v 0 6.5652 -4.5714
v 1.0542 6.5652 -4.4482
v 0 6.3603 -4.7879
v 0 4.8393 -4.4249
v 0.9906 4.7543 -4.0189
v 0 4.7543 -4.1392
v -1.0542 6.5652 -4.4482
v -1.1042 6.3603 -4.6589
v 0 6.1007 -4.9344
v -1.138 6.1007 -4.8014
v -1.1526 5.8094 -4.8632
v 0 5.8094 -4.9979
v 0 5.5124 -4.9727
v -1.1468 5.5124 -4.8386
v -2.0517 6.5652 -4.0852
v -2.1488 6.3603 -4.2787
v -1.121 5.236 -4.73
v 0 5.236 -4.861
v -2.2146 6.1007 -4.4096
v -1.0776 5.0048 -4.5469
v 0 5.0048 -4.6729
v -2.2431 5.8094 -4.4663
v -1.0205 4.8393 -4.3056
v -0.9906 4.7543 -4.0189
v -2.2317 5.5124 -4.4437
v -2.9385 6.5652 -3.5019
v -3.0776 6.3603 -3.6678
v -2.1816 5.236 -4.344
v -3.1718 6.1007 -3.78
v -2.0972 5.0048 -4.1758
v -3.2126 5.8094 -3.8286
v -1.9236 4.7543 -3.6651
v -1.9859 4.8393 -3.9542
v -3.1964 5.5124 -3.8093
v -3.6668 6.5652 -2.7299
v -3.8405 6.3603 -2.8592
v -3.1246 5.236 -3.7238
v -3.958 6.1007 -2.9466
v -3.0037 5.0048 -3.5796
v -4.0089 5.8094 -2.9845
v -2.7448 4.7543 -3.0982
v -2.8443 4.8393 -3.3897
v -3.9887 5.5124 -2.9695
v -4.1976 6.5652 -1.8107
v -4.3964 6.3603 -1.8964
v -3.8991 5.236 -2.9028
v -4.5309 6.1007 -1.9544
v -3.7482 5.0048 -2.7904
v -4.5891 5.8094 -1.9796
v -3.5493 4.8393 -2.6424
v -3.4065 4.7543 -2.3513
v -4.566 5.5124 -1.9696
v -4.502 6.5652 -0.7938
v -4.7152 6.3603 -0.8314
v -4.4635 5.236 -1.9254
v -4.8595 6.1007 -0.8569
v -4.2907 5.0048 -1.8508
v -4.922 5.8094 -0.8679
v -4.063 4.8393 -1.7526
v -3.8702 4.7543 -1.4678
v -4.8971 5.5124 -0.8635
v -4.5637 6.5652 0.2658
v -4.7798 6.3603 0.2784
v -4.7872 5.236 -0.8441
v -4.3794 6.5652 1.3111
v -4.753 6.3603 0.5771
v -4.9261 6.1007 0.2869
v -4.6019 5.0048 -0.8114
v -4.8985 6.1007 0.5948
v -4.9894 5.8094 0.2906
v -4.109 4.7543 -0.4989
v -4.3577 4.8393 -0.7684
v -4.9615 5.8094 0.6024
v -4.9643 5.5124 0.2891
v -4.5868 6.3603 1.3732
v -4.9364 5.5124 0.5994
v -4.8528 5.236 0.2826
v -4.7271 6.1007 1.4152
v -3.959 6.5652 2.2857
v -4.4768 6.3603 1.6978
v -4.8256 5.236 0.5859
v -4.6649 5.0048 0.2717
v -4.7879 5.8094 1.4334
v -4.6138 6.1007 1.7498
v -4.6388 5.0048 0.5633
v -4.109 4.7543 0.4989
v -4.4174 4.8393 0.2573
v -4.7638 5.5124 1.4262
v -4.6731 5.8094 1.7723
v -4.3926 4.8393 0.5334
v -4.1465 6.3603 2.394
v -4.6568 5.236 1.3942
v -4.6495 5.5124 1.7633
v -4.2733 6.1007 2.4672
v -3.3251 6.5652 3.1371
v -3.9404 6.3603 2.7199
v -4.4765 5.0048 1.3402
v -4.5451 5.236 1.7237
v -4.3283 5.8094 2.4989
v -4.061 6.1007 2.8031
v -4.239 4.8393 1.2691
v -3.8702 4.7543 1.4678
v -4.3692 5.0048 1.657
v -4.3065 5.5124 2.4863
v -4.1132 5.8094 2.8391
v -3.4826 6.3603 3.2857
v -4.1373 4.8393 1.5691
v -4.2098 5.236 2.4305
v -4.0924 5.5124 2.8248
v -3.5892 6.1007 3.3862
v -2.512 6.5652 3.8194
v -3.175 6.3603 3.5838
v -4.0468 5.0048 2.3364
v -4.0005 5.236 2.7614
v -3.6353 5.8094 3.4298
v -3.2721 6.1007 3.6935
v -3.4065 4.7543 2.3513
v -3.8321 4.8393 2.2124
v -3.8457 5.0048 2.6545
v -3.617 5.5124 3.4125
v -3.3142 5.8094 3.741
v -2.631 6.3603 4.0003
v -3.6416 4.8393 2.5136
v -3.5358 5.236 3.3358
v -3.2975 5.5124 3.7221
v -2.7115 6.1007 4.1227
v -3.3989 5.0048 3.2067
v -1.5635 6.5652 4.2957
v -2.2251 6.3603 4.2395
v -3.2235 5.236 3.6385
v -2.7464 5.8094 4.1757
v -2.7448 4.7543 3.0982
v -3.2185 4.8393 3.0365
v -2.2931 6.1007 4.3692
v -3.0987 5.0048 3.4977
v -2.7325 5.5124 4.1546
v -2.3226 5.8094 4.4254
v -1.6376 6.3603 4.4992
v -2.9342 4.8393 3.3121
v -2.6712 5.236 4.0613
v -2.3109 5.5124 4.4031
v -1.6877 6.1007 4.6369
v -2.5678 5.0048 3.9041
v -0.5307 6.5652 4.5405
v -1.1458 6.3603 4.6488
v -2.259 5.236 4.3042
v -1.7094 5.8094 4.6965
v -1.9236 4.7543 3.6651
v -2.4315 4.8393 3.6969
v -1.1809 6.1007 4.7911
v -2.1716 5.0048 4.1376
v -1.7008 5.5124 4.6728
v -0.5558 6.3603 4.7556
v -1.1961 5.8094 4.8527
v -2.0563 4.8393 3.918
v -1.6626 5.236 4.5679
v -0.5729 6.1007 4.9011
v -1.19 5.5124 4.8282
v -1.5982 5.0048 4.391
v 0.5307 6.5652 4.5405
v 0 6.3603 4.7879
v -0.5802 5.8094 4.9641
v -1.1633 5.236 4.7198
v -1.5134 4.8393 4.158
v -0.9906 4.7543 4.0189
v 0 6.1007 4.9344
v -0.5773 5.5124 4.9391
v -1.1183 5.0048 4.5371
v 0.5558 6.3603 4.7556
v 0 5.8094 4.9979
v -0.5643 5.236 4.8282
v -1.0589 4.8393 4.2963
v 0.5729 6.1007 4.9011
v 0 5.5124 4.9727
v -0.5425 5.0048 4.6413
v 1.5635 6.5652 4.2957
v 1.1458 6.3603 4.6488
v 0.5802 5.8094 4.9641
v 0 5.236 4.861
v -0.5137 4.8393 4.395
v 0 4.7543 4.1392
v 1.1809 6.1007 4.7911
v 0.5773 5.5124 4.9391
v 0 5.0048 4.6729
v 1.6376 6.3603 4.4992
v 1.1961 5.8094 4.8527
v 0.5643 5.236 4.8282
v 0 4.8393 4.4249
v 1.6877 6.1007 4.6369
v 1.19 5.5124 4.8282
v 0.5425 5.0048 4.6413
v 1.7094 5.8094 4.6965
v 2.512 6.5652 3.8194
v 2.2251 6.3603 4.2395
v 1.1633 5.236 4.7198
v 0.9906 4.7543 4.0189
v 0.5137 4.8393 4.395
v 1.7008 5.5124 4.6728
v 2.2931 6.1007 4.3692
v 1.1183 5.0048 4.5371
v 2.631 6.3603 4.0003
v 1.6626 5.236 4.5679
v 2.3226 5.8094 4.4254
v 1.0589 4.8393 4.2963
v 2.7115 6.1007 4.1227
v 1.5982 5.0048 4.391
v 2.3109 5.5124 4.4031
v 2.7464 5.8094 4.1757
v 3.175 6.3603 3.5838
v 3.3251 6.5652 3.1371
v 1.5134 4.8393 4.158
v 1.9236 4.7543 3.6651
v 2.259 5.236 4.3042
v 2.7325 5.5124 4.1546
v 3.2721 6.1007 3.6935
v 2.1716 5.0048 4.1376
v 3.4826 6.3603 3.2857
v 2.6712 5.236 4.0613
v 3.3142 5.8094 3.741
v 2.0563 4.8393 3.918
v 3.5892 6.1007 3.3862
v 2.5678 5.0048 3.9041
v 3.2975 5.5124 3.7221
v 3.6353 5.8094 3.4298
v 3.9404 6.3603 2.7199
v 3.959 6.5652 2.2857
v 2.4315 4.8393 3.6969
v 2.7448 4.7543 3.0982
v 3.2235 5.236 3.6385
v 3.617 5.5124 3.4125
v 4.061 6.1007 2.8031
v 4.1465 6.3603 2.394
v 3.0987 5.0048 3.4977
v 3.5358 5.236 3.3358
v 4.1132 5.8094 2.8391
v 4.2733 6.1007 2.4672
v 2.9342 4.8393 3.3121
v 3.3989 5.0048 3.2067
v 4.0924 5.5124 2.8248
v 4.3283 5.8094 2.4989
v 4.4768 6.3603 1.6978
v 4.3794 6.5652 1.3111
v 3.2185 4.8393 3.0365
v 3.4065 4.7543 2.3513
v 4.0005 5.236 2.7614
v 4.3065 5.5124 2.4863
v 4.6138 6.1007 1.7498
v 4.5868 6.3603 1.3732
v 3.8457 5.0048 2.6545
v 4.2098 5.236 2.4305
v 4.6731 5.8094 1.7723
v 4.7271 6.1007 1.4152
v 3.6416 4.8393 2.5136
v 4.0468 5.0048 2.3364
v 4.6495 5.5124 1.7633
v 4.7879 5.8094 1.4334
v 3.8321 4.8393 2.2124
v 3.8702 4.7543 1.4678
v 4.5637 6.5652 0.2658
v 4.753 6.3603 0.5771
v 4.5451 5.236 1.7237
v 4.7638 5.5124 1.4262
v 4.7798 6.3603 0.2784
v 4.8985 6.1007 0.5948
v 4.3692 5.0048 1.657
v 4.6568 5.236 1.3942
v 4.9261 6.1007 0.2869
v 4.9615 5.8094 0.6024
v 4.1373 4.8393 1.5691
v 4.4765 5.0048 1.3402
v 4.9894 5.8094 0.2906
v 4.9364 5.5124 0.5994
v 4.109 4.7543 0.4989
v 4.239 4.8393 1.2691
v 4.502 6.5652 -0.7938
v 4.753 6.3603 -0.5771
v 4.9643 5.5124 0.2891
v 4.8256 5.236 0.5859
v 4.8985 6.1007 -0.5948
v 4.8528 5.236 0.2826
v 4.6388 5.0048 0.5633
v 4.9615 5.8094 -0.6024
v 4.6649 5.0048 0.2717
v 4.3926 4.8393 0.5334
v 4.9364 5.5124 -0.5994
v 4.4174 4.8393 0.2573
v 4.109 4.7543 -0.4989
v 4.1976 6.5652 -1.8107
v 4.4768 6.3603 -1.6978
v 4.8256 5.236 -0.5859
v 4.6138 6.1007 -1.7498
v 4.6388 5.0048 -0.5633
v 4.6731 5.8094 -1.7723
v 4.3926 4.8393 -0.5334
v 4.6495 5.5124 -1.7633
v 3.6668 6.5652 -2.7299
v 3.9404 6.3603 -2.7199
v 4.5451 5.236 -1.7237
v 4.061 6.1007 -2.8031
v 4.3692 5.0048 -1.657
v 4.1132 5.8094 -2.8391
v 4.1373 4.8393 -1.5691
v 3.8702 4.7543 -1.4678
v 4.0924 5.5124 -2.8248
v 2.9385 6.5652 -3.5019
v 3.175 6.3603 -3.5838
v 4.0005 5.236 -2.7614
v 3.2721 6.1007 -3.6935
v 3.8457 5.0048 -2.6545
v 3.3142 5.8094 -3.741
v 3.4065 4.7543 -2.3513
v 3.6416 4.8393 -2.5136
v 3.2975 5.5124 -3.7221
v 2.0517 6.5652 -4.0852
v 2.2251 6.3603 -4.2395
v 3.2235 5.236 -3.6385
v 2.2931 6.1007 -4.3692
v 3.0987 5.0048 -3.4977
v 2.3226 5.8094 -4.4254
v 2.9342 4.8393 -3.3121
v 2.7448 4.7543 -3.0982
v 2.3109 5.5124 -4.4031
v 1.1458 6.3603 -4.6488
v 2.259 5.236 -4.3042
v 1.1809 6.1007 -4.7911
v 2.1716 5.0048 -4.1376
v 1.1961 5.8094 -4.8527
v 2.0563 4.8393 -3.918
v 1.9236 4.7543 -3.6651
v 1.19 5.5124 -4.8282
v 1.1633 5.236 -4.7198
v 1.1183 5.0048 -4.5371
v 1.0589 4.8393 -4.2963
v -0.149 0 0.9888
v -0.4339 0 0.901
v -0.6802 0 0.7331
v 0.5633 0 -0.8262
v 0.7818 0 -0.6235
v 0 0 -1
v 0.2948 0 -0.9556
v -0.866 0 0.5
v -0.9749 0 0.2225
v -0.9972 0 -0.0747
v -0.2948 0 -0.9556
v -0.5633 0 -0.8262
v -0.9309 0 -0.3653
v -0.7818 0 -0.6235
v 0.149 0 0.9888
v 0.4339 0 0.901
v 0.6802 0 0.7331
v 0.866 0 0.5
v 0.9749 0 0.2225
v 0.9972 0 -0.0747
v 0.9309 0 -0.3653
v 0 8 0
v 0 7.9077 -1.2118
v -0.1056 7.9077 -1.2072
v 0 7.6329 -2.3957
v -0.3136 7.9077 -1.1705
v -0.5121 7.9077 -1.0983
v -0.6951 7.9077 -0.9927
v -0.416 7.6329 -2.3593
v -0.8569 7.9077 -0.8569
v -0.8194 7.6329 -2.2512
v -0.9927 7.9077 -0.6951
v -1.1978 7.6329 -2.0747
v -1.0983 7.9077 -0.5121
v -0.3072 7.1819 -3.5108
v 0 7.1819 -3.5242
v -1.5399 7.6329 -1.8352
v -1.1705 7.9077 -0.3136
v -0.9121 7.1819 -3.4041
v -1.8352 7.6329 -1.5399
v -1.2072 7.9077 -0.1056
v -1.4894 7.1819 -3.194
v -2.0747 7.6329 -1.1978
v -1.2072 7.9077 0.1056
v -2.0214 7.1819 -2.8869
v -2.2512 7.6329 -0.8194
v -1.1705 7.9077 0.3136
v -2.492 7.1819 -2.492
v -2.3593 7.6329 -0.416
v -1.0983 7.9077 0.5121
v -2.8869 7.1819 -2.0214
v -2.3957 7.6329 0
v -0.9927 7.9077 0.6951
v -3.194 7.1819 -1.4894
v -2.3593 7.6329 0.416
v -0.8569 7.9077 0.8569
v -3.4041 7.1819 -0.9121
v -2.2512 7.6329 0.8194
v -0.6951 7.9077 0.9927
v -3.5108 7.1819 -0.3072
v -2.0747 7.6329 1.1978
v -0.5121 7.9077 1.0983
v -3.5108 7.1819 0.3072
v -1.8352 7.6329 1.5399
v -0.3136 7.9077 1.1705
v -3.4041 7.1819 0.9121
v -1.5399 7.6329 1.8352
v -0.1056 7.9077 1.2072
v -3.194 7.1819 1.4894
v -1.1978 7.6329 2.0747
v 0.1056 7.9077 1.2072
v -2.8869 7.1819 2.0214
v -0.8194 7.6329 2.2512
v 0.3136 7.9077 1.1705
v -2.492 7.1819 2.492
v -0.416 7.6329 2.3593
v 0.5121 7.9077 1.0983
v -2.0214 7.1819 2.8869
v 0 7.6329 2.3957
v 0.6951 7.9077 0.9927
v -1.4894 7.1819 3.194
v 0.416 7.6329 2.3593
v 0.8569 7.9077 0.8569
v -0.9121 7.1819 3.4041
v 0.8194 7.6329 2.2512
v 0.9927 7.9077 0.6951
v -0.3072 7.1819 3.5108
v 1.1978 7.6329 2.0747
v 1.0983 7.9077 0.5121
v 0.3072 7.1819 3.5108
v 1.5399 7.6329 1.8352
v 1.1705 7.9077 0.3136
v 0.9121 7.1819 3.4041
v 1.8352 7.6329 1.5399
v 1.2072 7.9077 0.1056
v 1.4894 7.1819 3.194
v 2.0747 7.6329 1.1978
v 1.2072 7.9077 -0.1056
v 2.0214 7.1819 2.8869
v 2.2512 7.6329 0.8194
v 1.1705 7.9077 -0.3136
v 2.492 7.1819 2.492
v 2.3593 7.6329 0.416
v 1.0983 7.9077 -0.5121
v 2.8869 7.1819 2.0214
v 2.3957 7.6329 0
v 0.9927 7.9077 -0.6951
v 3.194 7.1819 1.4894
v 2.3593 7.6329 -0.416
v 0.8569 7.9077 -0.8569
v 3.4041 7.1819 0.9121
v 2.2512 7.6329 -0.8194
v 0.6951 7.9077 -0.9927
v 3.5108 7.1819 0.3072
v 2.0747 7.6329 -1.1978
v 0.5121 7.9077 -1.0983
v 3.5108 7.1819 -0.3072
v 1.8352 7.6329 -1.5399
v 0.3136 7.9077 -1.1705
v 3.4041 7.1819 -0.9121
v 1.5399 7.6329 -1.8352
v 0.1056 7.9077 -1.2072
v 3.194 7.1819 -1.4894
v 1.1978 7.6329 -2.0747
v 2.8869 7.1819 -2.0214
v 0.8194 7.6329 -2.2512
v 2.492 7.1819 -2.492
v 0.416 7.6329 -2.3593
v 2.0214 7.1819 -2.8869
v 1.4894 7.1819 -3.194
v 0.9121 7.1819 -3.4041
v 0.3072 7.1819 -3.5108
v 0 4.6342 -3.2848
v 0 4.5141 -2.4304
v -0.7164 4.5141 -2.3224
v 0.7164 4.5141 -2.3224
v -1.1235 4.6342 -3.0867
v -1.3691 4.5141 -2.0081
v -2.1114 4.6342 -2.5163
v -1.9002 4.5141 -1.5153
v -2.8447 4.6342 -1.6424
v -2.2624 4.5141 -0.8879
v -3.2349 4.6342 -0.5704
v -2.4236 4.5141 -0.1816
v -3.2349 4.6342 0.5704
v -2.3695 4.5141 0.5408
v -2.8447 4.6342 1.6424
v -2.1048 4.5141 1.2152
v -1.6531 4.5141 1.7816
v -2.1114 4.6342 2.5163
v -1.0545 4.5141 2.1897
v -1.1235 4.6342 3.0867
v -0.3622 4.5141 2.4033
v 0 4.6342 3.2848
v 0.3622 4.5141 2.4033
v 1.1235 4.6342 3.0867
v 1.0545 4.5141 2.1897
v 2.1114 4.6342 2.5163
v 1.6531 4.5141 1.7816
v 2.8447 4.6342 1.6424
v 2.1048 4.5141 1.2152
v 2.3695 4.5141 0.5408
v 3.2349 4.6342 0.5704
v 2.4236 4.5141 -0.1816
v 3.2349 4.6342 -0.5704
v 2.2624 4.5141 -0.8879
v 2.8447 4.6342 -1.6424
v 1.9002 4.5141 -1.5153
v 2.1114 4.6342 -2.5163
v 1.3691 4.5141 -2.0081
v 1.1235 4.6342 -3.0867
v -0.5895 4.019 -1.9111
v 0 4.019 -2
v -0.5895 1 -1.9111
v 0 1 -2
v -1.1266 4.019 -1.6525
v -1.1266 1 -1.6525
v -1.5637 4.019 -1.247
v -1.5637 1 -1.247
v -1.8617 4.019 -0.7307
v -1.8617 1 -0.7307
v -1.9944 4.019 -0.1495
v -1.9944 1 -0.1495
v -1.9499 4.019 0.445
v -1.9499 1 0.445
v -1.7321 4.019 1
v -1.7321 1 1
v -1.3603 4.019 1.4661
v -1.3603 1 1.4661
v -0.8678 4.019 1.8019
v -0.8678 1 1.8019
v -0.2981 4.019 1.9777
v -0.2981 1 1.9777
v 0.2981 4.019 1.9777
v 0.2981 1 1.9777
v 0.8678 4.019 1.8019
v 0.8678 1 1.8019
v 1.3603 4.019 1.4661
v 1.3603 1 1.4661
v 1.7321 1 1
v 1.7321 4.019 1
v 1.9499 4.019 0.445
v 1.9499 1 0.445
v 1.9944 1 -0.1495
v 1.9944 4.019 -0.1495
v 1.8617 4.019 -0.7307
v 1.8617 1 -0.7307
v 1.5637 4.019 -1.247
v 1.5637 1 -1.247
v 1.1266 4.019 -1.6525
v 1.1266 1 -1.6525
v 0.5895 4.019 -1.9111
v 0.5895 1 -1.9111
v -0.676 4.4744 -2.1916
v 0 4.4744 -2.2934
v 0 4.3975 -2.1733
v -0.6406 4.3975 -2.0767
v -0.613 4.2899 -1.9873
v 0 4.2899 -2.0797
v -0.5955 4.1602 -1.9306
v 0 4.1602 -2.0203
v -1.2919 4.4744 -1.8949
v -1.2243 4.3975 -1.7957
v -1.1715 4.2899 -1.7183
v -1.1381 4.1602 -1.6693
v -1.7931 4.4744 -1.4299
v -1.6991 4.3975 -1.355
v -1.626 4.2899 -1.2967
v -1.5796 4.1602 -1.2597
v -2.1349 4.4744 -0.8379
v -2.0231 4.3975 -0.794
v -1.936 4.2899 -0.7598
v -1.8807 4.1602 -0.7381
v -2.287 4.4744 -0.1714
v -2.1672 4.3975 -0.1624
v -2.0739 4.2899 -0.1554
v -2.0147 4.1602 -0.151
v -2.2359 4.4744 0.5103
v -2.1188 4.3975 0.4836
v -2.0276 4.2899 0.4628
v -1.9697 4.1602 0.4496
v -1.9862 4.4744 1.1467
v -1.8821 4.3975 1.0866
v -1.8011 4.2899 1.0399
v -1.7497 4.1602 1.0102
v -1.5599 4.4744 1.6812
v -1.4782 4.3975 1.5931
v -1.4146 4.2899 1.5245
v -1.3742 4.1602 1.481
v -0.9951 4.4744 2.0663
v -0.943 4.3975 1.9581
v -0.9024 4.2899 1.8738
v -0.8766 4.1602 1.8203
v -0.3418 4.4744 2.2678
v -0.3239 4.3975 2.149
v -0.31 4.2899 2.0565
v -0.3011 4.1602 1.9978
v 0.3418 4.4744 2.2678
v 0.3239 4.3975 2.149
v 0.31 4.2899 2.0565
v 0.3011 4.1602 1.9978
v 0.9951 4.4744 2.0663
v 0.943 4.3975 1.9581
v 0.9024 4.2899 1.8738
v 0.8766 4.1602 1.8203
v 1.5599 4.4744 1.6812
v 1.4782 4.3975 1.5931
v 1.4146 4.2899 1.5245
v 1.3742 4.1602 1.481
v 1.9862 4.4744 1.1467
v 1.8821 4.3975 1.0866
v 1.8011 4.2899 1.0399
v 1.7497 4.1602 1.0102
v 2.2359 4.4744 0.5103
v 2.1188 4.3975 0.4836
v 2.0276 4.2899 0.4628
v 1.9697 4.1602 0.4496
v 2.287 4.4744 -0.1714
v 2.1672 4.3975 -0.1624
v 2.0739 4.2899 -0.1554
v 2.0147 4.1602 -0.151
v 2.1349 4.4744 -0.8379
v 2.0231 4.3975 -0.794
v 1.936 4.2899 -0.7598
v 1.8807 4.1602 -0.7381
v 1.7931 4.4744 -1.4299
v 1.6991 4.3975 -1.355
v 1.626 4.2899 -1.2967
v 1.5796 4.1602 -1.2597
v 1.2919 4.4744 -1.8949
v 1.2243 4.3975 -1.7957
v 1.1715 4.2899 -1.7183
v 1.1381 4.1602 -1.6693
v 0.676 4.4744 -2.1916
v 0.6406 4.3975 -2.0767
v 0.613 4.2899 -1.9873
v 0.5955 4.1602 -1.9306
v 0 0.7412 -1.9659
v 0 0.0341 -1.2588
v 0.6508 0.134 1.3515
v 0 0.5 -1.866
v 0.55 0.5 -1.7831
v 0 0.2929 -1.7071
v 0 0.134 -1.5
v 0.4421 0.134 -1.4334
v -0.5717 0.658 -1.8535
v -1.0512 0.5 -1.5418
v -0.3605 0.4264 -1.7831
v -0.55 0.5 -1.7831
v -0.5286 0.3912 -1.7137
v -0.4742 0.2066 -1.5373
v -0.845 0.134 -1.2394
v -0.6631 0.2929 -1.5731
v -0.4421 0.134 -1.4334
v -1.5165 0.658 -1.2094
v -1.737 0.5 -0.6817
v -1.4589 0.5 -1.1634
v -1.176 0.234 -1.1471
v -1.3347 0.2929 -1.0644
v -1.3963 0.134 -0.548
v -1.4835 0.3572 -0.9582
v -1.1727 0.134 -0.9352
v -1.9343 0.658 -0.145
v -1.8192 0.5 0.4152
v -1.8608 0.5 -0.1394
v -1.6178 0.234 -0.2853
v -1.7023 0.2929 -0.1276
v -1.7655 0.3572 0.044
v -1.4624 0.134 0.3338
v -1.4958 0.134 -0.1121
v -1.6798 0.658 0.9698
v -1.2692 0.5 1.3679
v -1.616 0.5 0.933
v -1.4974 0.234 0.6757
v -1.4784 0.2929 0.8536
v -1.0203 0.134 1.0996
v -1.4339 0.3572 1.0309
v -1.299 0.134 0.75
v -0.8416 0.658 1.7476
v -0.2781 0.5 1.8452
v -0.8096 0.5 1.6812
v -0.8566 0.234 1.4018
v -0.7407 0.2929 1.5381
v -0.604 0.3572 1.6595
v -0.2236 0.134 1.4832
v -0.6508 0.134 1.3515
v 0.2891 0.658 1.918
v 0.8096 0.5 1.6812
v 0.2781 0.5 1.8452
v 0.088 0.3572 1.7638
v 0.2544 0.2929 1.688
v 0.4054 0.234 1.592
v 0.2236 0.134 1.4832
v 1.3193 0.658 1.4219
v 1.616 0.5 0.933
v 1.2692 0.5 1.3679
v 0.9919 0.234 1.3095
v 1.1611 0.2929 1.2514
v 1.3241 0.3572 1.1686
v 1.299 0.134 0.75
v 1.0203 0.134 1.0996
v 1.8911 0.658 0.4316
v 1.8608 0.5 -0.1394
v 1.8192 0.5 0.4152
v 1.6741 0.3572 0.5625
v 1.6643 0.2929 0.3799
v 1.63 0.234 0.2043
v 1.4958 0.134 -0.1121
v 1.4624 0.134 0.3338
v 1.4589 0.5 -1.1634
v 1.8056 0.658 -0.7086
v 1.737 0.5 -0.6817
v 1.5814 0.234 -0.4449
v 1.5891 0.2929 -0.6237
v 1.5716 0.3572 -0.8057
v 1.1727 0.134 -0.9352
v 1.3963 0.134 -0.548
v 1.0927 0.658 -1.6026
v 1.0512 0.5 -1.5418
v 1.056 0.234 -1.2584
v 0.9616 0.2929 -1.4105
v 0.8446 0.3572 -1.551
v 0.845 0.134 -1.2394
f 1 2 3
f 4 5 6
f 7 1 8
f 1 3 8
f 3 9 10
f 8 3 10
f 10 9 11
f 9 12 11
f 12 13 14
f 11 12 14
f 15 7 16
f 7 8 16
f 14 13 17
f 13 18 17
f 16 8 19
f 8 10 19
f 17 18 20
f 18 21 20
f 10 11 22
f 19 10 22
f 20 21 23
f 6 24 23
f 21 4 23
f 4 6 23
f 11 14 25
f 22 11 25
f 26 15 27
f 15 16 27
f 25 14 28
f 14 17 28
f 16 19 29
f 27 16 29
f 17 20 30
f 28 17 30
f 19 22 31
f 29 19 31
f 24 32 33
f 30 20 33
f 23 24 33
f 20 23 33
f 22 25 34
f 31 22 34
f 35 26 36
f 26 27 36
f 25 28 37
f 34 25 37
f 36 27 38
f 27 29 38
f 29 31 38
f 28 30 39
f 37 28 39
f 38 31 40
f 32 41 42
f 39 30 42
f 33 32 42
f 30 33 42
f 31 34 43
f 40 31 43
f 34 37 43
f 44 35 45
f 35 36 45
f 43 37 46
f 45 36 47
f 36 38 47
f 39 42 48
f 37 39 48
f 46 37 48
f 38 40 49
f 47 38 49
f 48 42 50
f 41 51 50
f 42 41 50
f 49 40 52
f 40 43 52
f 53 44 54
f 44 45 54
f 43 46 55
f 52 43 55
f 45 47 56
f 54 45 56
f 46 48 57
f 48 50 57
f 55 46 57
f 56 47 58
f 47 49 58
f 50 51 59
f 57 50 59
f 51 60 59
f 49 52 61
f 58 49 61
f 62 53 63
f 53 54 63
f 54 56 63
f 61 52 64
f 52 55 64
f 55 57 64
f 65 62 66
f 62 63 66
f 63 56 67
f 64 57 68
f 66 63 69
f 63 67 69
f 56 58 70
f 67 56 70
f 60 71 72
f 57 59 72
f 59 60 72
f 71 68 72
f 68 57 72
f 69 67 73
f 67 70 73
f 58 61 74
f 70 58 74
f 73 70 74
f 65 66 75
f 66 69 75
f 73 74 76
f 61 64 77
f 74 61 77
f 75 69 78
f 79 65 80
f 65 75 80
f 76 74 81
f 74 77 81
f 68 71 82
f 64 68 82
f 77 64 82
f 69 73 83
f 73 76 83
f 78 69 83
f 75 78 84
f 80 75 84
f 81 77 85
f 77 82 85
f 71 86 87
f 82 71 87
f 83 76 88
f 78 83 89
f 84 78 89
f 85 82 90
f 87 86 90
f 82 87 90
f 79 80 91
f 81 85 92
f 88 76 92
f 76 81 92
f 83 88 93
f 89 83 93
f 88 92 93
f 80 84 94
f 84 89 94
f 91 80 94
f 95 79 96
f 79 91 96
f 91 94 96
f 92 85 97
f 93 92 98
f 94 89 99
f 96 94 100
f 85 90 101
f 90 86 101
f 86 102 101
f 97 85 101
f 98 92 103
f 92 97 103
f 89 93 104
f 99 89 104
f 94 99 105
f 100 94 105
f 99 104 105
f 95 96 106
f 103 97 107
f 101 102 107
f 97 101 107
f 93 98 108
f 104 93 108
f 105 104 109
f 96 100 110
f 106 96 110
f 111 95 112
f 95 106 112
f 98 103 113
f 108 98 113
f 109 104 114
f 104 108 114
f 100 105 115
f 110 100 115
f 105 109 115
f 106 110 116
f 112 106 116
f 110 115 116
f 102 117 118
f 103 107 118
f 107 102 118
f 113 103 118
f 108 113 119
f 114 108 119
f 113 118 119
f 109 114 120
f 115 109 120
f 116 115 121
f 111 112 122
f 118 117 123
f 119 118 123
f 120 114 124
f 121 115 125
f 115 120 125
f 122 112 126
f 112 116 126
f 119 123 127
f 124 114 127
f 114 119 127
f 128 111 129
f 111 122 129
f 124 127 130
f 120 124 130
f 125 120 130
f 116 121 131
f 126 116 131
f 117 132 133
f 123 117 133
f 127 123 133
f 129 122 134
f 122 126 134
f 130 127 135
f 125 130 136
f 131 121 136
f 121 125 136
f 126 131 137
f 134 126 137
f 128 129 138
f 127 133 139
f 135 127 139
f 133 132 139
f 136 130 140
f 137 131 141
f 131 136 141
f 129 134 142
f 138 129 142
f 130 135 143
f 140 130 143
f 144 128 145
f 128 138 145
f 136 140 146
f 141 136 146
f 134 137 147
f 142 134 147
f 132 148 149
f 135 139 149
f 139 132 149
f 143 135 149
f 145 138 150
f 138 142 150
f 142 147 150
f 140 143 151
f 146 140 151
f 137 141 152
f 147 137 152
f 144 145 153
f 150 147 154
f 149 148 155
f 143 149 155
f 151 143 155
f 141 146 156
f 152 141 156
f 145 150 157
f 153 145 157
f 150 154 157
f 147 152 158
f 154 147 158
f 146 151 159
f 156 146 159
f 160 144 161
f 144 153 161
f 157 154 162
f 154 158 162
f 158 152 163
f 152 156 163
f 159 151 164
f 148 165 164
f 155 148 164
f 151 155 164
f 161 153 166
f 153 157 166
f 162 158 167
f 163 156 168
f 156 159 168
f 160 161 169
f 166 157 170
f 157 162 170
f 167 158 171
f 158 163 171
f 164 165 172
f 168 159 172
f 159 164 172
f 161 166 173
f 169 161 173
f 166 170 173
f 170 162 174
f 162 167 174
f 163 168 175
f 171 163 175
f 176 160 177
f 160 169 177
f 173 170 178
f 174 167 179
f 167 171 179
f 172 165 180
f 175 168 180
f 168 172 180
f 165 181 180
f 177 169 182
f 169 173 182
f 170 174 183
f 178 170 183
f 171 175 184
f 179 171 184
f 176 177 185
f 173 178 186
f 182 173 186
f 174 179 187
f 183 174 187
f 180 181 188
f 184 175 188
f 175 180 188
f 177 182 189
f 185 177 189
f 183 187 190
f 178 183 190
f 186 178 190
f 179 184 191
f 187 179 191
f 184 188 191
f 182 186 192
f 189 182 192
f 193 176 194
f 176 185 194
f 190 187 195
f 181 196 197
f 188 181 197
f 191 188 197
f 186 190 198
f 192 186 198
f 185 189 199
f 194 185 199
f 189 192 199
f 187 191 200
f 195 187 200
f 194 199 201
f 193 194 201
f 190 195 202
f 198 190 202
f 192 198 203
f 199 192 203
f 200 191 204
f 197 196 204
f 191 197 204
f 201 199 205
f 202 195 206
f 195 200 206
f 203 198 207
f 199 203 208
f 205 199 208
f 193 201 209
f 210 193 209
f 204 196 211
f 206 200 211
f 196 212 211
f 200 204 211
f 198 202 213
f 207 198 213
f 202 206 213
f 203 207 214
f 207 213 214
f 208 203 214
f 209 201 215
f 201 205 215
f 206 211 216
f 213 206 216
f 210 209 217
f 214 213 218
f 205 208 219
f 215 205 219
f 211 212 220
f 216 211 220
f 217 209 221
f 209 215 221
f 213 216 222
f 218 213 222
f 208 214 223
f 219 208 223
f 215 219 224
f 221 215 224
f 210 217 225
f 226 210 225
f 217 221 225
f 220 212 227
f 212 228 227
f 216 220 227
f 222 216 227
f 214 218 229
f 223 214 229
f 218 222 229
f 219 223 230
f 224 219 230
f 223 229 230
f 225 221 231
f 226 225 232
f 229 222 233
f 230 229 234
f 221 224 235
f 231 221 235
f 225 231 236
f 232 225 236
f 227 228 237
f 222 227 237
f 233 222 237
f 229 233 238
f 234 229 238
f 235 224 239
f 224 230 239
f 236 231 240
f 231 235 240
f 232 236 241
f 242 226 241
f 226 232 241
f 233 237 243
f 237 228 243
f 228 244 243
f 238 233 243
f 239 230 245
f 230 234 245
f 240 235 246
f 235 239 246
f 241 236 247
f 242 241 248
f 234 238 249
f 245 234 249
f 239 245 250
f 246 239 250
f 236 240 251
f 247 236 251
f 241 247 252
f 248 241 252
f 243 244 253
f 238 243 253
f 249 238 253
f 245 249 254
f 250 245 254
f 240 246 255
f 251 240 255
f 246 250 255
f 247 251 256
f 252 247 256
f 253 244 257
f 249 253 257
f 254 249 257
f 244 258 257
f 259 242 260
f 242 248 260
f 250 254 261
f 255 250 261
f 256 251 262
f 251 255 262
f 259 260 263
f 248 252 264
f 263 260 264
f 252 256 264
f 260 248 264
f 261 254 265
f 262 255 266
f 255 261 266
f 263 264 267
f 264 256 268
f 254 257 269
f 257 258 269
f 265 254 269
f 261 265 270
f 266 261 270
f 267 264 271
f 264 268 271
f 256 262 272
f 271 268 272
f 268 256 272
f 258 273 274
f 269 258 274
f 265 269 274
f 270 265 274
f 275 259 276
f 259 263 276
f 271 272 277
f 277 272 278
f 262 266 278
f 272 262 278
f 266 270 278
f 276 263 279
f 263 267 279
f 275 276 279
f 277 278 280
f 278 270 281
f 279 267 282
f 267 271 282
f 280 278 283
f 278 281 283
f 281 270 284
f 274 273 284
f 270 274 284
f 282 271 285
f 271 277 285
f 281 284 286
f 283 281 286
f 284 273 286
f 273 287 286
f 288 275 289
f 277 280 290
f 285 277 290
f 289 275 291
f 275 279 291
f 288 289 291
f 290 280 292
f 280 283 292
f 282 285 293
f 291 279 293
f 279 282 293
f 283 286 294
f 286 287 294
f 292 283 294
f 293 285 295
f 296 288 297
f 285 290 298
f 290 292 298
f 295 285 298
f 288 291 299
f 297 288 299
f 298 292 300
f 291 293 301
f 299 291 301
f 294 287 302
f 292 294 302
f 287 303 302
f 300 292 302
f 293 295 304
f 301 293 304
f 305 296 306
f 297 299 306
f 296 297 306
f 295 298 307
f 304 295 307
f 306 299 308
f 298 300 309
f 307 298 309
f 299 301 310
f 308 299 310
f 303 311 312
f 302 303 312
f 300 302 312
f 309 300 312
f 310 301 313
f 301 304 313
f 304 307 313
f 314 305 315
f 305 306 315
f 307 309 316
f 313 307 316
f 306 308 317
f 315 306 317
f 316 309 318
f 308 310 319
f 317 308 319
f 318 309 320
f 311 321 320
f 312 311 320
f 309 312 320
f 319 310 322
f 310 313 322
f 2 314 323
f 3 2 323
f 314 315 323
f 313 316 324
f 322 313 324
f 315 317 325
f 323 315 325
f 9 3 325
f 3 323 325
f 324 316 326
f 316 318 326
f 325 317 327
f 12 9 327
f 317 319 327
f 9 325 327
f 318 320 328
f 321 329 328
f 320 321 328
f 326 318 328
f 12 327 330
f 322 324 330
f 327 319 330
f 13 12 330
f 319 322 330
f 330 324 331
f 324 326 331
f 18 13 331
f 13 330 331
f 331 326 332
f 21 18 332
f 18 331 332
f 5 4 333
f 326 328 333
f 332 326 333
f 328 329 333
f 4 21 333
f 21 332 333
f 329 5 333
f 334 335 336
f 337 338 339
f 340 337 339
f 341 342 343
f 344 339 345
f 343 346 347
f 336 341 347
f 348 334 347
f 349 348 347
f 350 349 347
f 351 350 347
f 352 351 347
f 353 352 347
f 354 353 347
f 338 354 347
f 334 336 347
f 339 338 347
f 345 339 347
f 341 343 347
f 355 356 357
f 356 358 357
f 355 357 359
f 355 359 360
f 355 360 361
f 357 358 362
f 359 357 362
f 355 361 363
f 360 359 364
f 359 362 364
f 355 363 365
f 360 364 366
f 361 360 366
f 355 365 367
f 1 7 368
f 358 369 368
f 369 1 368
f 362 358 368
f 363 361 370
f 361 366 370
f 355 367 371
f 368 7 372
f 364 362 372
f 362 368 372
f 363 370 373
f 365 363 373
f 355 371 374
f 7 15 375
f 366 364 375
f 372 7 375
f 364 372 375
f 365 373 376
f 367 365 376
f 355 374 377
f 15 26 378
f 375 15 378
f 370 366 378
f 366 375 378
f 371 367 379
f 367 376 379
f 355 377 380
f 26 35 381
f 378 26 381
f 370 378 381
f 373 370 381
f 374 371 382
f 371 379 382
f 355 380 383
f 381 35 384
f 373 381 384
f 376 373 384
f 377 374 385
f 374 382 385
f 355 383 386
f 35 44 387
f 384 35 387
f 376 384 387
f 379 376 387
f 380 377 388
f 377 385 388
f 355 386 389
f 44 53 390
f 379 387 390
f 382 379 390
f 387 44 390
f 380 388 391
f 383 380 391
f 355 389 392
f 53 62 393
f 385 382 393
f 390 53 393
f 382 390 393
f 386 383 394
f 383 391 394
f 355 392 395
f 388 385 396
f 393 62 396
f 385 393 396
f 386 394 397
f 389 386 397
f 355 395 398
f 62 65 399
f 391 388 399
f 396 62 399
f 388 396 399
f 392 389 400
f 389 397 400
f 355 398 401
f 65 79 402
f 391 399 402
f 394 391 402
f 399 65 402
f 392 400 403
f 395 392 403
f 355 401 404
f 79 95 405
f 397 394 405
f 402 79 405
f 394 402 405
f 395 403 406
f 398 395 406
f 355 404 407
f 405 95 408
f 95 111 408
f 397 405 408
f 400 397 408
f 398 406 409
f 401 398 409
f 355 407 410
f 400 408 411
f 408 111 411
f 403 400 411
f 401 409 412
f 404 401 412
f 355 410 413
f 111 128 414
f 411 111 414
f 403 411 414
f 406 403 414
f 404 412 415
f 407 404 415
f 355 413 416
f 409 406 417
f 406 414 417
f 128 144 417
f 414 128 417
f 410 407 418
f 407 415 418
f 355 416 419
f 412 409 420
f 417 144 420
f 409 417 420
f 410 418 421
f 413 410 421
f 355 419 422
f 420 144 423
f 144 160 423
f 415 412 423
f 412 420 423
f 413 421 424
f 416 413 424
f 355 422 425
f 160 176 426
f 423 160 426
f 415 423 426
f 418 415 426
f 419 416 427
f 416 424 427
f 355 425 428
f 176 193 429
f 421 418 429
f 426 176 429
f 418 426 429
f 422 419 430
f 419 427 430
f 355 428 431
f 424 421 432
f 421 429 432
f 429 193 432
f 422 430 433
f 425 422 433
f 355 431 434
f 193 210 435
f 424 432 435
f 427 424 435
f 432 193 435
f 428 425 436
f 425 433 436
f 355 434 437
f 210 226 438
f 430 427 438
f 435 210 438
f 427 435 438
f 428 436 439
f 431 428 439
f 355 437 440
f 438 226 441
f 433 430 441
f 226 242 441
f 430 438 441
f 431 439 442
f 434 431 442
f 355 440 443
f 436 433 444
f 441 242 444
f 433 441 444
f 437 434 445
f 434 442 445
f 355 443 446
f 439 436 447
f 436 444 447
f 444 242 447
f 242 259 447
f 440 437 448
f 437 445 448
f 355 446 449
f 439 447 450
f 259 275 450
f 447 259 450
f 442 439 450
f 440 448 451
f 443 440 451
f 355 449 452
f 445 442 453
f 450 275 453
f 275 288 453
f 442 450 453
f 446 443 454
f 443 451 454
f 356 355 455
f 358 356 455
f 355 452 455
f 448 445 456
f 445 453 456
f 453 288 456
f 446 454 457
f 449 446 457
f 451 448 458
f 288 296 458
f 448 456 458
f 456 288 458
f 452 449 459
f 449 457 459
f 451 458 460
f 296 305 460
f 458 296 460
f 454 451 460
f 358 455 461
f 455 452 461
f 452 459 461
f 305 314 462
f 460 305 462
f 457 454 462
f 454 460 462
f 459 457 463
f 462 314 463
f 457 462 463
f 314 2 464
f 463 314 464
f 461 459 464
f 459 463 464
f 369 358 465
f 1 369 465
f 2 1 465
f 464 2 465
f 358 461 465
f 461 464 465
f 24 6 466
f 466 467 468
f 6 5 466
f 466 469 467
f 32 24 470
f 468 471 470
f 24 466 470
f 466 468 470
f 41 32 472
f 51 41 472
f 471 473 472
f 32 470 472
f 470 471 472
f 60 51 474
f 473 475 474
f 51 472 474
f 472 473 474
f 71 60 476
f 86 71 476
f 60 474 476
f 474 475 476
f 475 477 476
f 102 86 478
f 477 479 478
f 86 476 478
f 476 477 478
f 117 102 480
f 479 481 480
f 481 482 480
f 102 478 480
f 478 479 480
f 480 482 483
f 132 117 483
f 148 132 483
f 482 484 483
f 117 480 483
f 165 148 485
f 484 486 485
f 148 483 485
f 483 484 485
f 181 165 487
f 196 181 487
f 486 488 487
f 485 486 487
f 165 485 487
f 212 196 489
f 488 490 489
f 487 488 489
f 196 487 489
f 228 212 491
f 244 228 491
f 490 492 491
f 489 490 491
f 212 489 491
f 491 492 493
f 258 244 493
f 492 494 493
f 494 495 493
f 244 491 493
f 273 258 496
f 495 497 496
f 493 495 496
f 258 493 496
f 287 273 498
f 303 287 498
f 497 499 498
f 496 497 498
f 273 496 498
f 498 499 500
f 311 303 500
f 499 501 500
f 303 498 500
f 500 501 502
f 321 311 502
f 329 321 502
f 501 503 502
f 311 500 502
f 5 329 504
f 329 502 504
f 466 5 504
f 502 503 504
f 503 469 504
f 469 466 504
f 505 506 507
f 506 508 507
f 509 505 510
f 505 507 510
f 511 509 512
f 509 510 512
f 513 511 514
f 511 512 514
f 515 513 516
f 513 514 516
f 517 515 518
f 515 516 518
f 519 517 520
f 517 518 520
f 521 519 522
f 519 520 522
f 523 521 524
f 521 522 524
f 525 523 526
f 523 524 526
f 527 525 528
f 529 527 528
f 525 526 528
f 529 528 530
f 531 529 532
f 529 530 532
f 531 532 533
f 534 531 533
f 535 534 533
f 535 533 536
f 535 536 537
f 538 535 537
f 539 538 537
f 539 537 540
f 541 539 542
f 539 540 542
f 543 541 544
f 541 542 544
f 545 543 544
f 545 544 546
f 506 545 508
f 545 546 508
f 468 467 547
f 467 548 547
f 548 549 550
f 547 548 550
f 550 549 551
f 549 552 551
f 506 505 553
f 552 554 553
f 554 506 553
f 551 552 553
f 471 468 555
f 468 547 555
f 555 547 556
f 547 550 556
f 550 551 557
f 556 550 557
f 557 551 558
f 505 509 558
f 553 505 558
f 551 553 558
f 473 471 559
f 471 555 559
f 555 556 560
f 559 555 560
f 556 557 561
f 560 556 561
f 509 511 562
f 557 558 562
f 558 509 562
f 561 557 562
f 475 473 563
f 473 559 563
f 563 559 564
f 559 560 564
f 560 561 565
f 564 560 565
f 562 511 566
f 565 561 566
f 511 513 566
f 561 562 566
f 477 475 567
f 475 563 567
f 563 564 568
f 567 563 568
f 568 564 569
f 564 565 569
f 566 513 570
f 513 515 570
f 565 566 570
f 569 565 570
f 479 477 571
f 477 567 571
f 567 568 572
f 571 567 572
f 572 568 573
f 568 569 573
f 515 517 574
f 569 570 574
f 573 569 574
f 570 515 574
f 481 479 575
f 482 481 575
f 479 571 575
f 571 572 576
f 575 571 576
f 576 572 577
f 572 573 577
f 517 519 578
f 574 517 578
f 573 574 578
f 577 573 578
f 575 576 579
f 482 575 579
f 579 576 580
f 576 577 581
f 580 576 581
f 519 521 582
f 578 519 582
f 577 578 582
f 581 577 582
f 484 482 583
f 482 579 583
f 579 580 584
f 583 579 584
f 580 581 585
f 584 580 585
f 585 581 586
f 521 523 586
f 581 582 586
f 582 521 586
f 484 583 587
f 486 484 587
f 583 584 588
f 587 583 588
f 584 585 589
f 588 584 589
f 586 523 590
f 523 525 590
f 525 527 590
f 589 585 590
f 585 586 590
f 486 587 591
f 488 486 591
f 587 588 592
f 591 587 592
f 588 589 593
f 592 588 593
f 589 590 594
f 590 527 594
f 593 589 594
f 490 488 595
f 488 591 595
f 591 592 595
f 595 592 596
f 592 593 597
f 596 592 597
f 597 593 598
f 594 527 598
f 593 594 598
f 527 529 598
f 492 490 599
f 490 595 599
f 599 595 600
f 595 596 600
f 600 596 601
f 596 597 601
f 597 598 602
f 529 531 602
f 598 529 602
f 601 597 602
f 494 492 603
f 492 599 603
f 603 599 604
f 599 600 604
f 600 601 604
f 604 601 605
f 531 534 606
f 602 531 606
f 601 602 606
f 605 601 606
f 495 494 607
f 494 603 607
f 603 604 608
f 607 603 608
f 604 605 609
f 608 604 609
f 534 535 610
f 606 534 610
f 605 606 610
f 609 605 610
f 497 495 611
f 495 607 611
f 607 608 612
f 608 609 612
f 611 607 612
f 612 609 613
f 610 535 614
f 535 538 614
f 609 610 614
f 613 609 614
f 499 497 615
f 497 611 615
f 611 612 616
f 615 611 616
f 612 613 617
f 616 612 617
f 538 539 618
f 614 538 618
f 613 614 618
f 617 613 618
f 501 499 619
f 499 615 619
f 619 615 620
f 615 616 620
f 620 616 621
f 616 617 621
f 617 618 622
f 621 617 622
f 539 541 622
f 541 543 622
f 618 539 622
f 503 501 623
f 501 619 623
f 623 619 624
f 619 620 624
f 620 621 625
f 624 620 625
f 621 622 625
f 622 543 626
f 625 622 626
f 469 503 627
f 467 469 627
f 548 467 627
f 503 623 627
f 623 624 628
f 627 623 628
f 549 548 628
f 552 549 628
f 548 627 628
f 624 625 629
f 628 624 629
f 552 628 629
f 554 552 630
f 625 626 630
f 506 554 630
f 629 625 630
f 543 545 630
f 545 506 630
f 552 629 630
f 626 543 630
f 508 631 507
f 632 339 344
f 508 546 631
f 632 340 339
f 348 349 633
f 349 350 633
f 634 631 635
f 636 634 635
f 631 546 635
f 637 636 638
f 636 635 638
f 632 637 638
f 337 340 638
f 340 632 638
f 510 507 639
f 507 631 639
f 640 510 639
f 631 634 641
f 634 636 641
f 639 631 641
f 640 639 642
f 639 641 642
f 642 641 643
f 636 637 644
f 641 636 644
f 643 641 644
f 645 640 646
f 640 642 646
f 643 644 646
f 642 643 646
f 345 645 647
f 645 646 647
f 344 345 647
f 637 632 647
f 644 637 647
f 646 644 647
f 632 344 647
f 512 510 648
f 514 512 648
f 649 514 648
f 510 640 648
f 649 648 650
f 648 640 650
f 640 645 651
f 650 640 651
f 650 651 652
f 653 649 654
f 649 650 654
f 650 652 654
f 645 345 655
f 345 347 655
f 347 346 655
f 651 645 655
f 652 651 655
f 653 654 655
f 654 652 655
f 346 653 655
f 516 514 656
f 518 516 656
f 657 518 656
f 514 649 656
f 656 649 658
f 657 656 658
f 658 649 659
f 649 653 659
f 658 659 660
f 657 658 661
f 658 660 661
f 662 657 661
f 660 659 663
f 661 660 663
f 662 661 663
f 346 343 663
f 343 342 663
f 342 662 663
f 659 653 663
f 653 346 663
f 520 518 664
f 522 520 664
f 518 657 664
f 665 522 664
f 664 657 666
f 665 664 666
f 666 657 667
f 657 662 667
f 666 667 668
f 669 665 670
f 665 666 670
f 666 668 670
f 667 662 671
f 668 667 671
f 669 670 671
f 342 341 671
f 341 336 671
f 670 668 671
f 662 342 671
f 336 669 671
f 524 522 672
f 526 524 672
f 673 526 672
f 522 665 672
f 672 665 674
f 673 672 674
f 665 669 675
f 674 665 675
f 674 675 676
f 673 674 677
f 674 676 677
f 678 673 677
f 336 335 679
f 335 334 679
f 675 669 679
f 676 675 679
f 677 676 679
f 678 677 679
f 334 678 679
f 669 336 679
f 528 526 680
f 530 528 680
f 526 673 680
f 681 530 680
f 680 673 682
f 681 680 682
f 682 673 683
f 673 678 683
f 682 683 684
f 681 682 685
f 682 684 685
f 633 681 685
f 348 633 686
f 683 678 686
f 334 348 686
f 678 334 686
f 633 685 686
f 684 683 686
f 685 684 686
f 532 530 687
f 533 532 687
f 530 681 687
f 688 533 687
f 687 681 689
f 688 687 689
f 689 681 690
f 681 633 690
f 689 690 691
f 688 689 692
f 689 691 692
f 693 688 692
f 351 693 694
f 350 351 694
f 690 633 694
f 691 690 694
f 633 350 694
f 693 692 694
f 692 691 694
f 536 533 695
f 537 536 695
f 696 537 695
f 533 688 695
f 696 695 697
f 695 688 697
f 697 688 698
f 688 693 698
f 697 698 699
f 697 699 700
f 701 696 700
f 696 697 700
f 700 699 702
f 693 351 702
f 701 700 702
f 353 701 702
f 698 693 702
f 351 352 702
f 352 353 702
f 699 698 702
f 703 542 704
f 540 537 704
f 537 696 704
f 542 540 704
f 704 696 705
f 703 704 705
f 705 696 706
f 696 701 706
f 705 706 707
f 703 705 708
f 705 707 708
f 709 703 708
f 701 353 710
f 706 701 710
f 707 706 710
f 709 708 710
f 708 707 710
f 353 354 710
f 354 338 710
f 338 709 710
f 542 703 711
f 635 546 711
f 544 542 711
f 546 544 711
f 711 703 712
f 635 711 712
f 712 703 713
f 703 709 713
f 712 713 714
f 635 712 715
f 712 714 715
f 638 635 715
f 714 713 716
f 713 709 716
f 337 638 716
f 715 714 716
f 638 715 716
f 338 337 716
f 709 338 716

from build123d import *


with BuildPart() as part:
    # Croquis1 → Revolución1 (revolve)
    with BuildSketch(Plane.XY):
        with BuildLine():
            Line((-1, 0), (0, 0))
            Line((0, 0), (0, 8))
            ThreePointArc((0, 8), (-2.395650681, 7.632880047), (-4.571428571, 6.565214453))
            ThreePointArc((-4.571428571, 6.565214453), (-4.97267486, 5.512391122), (-4.139173101, 4.754294578))
            Line((-4.139173101, 4.754294578), (-2.43041345, 4.51414407))
            ThreePointArc((-2.43041345, 4.51414407), (-2.12264521, 4.34703955), (-2, 4.019010036))
            Line((-2, 4.019010036), (-2, 1))
            ThreePointArc((-2, 1), (-1.707106781, 0.292893219), (-1, 0))
        make_face()
    revolve(axis=Axis((0, 0, 0), (0, 1, 0)))


solid = part.part
